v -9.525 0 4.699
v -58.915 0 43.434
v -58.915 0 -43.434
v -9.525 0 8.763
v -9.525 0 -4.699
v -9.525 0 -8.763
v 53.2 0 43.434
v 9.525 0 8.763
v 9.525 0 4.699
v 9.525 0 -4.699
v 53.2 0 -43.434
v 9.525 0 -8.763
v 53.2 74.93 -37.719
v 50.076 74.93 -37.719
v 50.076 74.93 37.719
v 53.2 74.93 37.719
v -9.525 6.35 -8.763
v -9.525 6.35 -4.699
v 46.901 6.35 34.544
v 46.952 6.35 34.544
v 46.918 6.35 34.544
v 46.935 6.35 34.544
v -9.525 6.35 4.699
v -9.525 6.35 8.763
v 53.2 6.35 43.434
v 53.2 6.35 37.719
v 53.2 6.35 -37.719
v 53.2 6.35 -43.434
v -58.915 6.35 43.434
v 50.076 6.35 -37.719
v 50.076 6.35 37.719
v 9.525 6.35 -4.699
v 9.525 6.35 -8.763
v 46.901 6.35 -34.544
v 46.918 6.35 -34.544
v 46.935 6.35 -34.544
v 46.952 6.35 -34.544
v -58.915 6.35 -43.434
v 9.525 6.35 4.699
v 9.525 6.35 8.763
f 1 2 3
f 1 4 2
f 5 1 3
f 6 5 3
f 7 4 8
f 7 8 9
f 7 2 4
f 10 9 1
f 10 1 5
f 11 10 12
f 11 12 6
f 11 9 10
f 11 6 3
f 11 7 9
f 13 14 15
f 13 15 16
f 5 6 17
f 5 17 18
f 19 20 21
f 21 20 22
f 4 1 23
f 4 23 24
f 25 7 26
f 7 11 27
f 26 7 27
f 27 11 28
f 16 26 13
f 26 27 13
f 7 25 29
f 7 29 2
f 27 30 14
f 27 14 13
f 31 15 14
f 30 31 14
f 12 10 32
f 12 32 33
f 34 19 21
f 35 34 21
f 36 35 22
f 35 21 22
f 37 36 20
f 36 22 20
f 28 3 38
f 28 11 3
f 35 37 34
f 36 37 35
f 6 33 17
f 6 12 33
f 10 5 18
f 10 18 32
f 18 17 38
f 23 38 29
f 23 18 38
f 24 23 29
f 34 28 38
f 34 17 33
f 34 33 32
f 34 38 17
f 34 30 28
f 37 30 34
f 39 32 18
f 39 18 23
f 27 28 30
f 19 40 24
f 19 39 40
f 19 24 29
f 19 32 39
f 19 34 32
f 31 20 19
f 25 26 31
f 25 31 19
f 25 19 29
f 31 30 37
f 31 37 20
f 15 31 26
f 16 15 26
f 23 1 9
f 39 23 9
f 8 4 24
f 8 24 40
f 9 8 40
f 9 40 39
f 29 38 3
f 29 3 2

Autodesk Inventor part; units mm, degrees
ref_plane "YZ Plane" through (0, 0, 0) normal (1, 0, 0) x (0, 1, 0)
ref_plane "XZ Plane" through (0, 0, 0) normal (0, 1, 0) x (-1, 0, 0)
ref_plane "XY Plane" through (0, 0, 0) normal (0, 0, 1) x (1, 0, 0)
sketch "Sketch1" plane through (0, 0, 0) normal (0, 1, 0) x (-1, 0, 0)
  line L0 (53.2003, -37.719) -> (-53.2003, -37.719)
  line L1 (-53.2003, -37.719) -> (-53.2003, 37.719)
  line L2 (-53.2003, 37.719) -> (53.2003, 37.719)
  line L3 (53.2003, 37.719) -> (53.2003, -37.719)
  line L4 (53.2003, -37.719) -> (-53.2003, 37.719) construction
  line L5 (-53.2003, -37.719) -> (53.2003, 37.719) construction
  point P0 (0, 0)
  dimension "d0" = 106.4006
  dimension "d1" = 75.438
extrude "Extrusion1" add sketch "Sketch1" along normal blind 6.35
sketch "Sketch2" plane through (0, 6.35, 0) normal (0, 1, 0) x (1, 0, 0)
  line L0 (53.2003, -37.719) -> (53.2003, 37.719) projected
  line L1 (53.2003, -37.719) -> (53.2003, -34.544)
  line L2 (53.2003, -34.544) -> (50.0761, -34.544)
  line L3 (53.2003, 37.719) -> (53.2003, 34.544)
  line L4 (53.2003, 34.544) -> (50.0761, 34.544)
  line L5 (50.0761, 34.544) -> (50.0761, -34.544)
  line L6 (53.2003, -34.544) -> (53.2003, 34.544)
  point P0 (0, 0)
  dimension "d4" = 3.175
  dimension "d5" = 3.1242
  dimension "d6" = 3.175
extrude "Extrusion2" add sketch "Sketch2" along normal blind 68.58
fillet "Fillet1" radius 3.175 1 edges at (50.0761, 6.35, 0)
sketch "Sketch3" plane through (0, 0, 0) normal (0, -1, 0) x (1, 0, 0)
  line L0 (-9.525, 8.763) -> (9.525, 8.763)
  line L1 (9.525, 8.763) -> (9.525, -8.763)
  line L2 (9.525, -8.763) -> (-9.525, -8.763)
  line L3 (-9.525, -8.763) -> (-9.525, 8.763)
  line L4 (-9.525, 8.763) -> (9.525, -8.763) construction
  line L5 (9.525, 8.763) -> (-9.525, -8.763) construction
  line L6 (9.525, -8.763) -> (-9.525, -8.763)
  line L7 (-9.525, -8.763) -> (-9.525, -4.699)
  line L8 (-9.525, -4.699) -> (9.525, -4.699)
  line L9 (9.525, -4.699) -> (9.525, -8.763)
  line L10 (9.525, 8.763) -> (-9.525, 8.763)
  line L11 (-9.525, 8.763) -> (-9.525, 4.699)
  line L12 (-9.525, 4.699) -> (9.525, 4.699)
  line L13 (9.525, 4.699) -> (9.525, 8.763)
  point P0 (0, 0)
  dimension "d10" = 19.05
  dimension "d11" = 17.526
  dimension "d12" = 4.064
  dimension "d13" = 4.064
extrude "Extrusion3" cut sketch "Sketch3" against normal blind 68.58 contours L0 L1 L12 L3 | L8 L1 L2 L3
sketch "Sketch4" plane through (0, 0, 0) normal (0, -1, 0) x (1, 0, 0)
  point P0 (0, 0)
sketch "Sketch5" plane through (0, 0, 0) normal (0, -1, 0) x (1, 0, 0)
  point P0 (0, 0)
sketch "Sketch6" plane through (53.2003, 0, -37.719) normal (0, 0, -1) x (-1, 0, 0)
  line L0 (106.4006, 0) -> (0, 0) projected
  line L1 (0, 6.35) -> (106.4006, 6.35) projected
  line L2 (106.4006, 0) -> (0, 0)
  line L3 (0, 0) -> (0, 6.35)
  line L4 (0, 6.35) -> (106.4006, 6.35)
  line L5 (106.4006, 6.35) -> (106.4006, 0)
  point P0 (53.2003, 0)
sketch "Sketch7" plane through (0, 6.35, 0) normal (0, 1, 0) x (1, 0, 0)
  line L0 (53.2003, 34.544) -> (53.2003, 37.719) projected
  line L1 (46.9519, -37.719) -> (53.2003, -37.719)
  line L2 (53.2003, -37.719) -> (53.2003, 37.719)
  line L3 (53.2003, 37.719) -> (46.9519, 37.719)
  line L4 (46.9519, 37.719) -> (46.9519, -37.719)
  line L5 (50.0761, 34.544) -> (50.0761, -34.544) projected
  line L6 (46.9519, -37.719) -> (53.2003, 37.719) construction
  line L7 (53.2003, -37.719) -> (46.9519, 37.719) construction
  point P0 (0, 0)
  point P1 (50.0761, 0)
extrude "Extrusion4" add sketch "Sketch7" along normal blind 68.58
sketch "Sketch8" plane through (0, 74.93, 0) normal (0, 1, 0) x (1, 0, 0)
  line L0 (53.2003, -37.719) -> (53.2003, 37.719) projected
  line L1 (53.2003, 37.719) -> (46.9519, 37.719) projected
  line L2 (53.2003, -37.719) -> (50.0761, -37.719)
  line L3 (50.0761, -37.719) -> (50.0761, 37.719)
  line L4 (50.0761, 37.719) -> (53.2003, 37.719)
  line L5 (53.2003, 37.719) -> (53.2003, -37.719)
  line L6 (46.9519, -37.719) -> (53.2003, -37.719) projected
  line L7 (50.0761, 37.719) -> (46.9519, 37.719)
  line L8 (46.9519, 37.719) -> (46.9519, -37.719)
  line L9 (46.9519, -37.719) -> (50.0761, -37.719)
  line L10 (50.0761, -37.719) -> (50.0761, 37.719)
  point P0 (0, 0)
extrude "Extrusion5" cut sketch "Sketch8" against normal blind 68.58 contours L6 L8 L1 L3
sketch "Sketch9" plane through (53.2003, 0, -37.719) normal (0, 0, -1) x (-1, 0, 0)
  line L0 (3.1242, 6.35) -> (106.4006, 6.35) projected
  line L1 (106.4006, 6.35) -> (0, 6.35)
  line L2 (0, 6.35) -> (0, 0)
  line L3 (0, 0) -> (106.4006, 0)
  line L4 (106.4006, 0) -> (106.4006, 6.35)
  point P0 (53.2003, 0)
extrude "Extrusion6" add sketch "Sketch9" along normal blind 5.715
sketch "Sketch10" plane through (-53.2003, 0, 37.719) normal (0, 0, 1) x (1, 0, 0)
  line L0 (0, 6.35) -> (106.4006, 6.35) projected
  line L1 (106.4006, 0) -> (106.4006, 74.93) projected
  line L2 (0, 6.35) -> (106.4006, 6.35)
  line L3 (106.4006, 6.35) -> (106.4006, 0)
  line L4 (106.4006, 0) -> (0, 0)
  line L5 (0, 0) -> (0, 6.35)
  point P0 (53.2003, 0)
extrude "Extrusion7" add sketch "Sketch10" along normal blind 5.715
sketch "Sketch11" plane through (-53.2003, 0, -43.434) normal (-1, 0, 0) x (0, 0, 1)
  line L0 (0, 0) -> (0, 6.35) projected
  line L1 (86.868, 0) -> (0, 0) projected
  line L2 (0, 6.35) -> (86.868, 6.35)
  line L3 (86.868, 6.35) -> (86.868, 0)
  line L4 (86.868, 0) -> (0, 0)
  line L5 (0, 0) -> (0, 6.35)
  point P0 (43.434, 0)
extrude "Extrusion8" add sketch "Sketch11" along normal blind 5.715
properties part number "Boxpt2"
